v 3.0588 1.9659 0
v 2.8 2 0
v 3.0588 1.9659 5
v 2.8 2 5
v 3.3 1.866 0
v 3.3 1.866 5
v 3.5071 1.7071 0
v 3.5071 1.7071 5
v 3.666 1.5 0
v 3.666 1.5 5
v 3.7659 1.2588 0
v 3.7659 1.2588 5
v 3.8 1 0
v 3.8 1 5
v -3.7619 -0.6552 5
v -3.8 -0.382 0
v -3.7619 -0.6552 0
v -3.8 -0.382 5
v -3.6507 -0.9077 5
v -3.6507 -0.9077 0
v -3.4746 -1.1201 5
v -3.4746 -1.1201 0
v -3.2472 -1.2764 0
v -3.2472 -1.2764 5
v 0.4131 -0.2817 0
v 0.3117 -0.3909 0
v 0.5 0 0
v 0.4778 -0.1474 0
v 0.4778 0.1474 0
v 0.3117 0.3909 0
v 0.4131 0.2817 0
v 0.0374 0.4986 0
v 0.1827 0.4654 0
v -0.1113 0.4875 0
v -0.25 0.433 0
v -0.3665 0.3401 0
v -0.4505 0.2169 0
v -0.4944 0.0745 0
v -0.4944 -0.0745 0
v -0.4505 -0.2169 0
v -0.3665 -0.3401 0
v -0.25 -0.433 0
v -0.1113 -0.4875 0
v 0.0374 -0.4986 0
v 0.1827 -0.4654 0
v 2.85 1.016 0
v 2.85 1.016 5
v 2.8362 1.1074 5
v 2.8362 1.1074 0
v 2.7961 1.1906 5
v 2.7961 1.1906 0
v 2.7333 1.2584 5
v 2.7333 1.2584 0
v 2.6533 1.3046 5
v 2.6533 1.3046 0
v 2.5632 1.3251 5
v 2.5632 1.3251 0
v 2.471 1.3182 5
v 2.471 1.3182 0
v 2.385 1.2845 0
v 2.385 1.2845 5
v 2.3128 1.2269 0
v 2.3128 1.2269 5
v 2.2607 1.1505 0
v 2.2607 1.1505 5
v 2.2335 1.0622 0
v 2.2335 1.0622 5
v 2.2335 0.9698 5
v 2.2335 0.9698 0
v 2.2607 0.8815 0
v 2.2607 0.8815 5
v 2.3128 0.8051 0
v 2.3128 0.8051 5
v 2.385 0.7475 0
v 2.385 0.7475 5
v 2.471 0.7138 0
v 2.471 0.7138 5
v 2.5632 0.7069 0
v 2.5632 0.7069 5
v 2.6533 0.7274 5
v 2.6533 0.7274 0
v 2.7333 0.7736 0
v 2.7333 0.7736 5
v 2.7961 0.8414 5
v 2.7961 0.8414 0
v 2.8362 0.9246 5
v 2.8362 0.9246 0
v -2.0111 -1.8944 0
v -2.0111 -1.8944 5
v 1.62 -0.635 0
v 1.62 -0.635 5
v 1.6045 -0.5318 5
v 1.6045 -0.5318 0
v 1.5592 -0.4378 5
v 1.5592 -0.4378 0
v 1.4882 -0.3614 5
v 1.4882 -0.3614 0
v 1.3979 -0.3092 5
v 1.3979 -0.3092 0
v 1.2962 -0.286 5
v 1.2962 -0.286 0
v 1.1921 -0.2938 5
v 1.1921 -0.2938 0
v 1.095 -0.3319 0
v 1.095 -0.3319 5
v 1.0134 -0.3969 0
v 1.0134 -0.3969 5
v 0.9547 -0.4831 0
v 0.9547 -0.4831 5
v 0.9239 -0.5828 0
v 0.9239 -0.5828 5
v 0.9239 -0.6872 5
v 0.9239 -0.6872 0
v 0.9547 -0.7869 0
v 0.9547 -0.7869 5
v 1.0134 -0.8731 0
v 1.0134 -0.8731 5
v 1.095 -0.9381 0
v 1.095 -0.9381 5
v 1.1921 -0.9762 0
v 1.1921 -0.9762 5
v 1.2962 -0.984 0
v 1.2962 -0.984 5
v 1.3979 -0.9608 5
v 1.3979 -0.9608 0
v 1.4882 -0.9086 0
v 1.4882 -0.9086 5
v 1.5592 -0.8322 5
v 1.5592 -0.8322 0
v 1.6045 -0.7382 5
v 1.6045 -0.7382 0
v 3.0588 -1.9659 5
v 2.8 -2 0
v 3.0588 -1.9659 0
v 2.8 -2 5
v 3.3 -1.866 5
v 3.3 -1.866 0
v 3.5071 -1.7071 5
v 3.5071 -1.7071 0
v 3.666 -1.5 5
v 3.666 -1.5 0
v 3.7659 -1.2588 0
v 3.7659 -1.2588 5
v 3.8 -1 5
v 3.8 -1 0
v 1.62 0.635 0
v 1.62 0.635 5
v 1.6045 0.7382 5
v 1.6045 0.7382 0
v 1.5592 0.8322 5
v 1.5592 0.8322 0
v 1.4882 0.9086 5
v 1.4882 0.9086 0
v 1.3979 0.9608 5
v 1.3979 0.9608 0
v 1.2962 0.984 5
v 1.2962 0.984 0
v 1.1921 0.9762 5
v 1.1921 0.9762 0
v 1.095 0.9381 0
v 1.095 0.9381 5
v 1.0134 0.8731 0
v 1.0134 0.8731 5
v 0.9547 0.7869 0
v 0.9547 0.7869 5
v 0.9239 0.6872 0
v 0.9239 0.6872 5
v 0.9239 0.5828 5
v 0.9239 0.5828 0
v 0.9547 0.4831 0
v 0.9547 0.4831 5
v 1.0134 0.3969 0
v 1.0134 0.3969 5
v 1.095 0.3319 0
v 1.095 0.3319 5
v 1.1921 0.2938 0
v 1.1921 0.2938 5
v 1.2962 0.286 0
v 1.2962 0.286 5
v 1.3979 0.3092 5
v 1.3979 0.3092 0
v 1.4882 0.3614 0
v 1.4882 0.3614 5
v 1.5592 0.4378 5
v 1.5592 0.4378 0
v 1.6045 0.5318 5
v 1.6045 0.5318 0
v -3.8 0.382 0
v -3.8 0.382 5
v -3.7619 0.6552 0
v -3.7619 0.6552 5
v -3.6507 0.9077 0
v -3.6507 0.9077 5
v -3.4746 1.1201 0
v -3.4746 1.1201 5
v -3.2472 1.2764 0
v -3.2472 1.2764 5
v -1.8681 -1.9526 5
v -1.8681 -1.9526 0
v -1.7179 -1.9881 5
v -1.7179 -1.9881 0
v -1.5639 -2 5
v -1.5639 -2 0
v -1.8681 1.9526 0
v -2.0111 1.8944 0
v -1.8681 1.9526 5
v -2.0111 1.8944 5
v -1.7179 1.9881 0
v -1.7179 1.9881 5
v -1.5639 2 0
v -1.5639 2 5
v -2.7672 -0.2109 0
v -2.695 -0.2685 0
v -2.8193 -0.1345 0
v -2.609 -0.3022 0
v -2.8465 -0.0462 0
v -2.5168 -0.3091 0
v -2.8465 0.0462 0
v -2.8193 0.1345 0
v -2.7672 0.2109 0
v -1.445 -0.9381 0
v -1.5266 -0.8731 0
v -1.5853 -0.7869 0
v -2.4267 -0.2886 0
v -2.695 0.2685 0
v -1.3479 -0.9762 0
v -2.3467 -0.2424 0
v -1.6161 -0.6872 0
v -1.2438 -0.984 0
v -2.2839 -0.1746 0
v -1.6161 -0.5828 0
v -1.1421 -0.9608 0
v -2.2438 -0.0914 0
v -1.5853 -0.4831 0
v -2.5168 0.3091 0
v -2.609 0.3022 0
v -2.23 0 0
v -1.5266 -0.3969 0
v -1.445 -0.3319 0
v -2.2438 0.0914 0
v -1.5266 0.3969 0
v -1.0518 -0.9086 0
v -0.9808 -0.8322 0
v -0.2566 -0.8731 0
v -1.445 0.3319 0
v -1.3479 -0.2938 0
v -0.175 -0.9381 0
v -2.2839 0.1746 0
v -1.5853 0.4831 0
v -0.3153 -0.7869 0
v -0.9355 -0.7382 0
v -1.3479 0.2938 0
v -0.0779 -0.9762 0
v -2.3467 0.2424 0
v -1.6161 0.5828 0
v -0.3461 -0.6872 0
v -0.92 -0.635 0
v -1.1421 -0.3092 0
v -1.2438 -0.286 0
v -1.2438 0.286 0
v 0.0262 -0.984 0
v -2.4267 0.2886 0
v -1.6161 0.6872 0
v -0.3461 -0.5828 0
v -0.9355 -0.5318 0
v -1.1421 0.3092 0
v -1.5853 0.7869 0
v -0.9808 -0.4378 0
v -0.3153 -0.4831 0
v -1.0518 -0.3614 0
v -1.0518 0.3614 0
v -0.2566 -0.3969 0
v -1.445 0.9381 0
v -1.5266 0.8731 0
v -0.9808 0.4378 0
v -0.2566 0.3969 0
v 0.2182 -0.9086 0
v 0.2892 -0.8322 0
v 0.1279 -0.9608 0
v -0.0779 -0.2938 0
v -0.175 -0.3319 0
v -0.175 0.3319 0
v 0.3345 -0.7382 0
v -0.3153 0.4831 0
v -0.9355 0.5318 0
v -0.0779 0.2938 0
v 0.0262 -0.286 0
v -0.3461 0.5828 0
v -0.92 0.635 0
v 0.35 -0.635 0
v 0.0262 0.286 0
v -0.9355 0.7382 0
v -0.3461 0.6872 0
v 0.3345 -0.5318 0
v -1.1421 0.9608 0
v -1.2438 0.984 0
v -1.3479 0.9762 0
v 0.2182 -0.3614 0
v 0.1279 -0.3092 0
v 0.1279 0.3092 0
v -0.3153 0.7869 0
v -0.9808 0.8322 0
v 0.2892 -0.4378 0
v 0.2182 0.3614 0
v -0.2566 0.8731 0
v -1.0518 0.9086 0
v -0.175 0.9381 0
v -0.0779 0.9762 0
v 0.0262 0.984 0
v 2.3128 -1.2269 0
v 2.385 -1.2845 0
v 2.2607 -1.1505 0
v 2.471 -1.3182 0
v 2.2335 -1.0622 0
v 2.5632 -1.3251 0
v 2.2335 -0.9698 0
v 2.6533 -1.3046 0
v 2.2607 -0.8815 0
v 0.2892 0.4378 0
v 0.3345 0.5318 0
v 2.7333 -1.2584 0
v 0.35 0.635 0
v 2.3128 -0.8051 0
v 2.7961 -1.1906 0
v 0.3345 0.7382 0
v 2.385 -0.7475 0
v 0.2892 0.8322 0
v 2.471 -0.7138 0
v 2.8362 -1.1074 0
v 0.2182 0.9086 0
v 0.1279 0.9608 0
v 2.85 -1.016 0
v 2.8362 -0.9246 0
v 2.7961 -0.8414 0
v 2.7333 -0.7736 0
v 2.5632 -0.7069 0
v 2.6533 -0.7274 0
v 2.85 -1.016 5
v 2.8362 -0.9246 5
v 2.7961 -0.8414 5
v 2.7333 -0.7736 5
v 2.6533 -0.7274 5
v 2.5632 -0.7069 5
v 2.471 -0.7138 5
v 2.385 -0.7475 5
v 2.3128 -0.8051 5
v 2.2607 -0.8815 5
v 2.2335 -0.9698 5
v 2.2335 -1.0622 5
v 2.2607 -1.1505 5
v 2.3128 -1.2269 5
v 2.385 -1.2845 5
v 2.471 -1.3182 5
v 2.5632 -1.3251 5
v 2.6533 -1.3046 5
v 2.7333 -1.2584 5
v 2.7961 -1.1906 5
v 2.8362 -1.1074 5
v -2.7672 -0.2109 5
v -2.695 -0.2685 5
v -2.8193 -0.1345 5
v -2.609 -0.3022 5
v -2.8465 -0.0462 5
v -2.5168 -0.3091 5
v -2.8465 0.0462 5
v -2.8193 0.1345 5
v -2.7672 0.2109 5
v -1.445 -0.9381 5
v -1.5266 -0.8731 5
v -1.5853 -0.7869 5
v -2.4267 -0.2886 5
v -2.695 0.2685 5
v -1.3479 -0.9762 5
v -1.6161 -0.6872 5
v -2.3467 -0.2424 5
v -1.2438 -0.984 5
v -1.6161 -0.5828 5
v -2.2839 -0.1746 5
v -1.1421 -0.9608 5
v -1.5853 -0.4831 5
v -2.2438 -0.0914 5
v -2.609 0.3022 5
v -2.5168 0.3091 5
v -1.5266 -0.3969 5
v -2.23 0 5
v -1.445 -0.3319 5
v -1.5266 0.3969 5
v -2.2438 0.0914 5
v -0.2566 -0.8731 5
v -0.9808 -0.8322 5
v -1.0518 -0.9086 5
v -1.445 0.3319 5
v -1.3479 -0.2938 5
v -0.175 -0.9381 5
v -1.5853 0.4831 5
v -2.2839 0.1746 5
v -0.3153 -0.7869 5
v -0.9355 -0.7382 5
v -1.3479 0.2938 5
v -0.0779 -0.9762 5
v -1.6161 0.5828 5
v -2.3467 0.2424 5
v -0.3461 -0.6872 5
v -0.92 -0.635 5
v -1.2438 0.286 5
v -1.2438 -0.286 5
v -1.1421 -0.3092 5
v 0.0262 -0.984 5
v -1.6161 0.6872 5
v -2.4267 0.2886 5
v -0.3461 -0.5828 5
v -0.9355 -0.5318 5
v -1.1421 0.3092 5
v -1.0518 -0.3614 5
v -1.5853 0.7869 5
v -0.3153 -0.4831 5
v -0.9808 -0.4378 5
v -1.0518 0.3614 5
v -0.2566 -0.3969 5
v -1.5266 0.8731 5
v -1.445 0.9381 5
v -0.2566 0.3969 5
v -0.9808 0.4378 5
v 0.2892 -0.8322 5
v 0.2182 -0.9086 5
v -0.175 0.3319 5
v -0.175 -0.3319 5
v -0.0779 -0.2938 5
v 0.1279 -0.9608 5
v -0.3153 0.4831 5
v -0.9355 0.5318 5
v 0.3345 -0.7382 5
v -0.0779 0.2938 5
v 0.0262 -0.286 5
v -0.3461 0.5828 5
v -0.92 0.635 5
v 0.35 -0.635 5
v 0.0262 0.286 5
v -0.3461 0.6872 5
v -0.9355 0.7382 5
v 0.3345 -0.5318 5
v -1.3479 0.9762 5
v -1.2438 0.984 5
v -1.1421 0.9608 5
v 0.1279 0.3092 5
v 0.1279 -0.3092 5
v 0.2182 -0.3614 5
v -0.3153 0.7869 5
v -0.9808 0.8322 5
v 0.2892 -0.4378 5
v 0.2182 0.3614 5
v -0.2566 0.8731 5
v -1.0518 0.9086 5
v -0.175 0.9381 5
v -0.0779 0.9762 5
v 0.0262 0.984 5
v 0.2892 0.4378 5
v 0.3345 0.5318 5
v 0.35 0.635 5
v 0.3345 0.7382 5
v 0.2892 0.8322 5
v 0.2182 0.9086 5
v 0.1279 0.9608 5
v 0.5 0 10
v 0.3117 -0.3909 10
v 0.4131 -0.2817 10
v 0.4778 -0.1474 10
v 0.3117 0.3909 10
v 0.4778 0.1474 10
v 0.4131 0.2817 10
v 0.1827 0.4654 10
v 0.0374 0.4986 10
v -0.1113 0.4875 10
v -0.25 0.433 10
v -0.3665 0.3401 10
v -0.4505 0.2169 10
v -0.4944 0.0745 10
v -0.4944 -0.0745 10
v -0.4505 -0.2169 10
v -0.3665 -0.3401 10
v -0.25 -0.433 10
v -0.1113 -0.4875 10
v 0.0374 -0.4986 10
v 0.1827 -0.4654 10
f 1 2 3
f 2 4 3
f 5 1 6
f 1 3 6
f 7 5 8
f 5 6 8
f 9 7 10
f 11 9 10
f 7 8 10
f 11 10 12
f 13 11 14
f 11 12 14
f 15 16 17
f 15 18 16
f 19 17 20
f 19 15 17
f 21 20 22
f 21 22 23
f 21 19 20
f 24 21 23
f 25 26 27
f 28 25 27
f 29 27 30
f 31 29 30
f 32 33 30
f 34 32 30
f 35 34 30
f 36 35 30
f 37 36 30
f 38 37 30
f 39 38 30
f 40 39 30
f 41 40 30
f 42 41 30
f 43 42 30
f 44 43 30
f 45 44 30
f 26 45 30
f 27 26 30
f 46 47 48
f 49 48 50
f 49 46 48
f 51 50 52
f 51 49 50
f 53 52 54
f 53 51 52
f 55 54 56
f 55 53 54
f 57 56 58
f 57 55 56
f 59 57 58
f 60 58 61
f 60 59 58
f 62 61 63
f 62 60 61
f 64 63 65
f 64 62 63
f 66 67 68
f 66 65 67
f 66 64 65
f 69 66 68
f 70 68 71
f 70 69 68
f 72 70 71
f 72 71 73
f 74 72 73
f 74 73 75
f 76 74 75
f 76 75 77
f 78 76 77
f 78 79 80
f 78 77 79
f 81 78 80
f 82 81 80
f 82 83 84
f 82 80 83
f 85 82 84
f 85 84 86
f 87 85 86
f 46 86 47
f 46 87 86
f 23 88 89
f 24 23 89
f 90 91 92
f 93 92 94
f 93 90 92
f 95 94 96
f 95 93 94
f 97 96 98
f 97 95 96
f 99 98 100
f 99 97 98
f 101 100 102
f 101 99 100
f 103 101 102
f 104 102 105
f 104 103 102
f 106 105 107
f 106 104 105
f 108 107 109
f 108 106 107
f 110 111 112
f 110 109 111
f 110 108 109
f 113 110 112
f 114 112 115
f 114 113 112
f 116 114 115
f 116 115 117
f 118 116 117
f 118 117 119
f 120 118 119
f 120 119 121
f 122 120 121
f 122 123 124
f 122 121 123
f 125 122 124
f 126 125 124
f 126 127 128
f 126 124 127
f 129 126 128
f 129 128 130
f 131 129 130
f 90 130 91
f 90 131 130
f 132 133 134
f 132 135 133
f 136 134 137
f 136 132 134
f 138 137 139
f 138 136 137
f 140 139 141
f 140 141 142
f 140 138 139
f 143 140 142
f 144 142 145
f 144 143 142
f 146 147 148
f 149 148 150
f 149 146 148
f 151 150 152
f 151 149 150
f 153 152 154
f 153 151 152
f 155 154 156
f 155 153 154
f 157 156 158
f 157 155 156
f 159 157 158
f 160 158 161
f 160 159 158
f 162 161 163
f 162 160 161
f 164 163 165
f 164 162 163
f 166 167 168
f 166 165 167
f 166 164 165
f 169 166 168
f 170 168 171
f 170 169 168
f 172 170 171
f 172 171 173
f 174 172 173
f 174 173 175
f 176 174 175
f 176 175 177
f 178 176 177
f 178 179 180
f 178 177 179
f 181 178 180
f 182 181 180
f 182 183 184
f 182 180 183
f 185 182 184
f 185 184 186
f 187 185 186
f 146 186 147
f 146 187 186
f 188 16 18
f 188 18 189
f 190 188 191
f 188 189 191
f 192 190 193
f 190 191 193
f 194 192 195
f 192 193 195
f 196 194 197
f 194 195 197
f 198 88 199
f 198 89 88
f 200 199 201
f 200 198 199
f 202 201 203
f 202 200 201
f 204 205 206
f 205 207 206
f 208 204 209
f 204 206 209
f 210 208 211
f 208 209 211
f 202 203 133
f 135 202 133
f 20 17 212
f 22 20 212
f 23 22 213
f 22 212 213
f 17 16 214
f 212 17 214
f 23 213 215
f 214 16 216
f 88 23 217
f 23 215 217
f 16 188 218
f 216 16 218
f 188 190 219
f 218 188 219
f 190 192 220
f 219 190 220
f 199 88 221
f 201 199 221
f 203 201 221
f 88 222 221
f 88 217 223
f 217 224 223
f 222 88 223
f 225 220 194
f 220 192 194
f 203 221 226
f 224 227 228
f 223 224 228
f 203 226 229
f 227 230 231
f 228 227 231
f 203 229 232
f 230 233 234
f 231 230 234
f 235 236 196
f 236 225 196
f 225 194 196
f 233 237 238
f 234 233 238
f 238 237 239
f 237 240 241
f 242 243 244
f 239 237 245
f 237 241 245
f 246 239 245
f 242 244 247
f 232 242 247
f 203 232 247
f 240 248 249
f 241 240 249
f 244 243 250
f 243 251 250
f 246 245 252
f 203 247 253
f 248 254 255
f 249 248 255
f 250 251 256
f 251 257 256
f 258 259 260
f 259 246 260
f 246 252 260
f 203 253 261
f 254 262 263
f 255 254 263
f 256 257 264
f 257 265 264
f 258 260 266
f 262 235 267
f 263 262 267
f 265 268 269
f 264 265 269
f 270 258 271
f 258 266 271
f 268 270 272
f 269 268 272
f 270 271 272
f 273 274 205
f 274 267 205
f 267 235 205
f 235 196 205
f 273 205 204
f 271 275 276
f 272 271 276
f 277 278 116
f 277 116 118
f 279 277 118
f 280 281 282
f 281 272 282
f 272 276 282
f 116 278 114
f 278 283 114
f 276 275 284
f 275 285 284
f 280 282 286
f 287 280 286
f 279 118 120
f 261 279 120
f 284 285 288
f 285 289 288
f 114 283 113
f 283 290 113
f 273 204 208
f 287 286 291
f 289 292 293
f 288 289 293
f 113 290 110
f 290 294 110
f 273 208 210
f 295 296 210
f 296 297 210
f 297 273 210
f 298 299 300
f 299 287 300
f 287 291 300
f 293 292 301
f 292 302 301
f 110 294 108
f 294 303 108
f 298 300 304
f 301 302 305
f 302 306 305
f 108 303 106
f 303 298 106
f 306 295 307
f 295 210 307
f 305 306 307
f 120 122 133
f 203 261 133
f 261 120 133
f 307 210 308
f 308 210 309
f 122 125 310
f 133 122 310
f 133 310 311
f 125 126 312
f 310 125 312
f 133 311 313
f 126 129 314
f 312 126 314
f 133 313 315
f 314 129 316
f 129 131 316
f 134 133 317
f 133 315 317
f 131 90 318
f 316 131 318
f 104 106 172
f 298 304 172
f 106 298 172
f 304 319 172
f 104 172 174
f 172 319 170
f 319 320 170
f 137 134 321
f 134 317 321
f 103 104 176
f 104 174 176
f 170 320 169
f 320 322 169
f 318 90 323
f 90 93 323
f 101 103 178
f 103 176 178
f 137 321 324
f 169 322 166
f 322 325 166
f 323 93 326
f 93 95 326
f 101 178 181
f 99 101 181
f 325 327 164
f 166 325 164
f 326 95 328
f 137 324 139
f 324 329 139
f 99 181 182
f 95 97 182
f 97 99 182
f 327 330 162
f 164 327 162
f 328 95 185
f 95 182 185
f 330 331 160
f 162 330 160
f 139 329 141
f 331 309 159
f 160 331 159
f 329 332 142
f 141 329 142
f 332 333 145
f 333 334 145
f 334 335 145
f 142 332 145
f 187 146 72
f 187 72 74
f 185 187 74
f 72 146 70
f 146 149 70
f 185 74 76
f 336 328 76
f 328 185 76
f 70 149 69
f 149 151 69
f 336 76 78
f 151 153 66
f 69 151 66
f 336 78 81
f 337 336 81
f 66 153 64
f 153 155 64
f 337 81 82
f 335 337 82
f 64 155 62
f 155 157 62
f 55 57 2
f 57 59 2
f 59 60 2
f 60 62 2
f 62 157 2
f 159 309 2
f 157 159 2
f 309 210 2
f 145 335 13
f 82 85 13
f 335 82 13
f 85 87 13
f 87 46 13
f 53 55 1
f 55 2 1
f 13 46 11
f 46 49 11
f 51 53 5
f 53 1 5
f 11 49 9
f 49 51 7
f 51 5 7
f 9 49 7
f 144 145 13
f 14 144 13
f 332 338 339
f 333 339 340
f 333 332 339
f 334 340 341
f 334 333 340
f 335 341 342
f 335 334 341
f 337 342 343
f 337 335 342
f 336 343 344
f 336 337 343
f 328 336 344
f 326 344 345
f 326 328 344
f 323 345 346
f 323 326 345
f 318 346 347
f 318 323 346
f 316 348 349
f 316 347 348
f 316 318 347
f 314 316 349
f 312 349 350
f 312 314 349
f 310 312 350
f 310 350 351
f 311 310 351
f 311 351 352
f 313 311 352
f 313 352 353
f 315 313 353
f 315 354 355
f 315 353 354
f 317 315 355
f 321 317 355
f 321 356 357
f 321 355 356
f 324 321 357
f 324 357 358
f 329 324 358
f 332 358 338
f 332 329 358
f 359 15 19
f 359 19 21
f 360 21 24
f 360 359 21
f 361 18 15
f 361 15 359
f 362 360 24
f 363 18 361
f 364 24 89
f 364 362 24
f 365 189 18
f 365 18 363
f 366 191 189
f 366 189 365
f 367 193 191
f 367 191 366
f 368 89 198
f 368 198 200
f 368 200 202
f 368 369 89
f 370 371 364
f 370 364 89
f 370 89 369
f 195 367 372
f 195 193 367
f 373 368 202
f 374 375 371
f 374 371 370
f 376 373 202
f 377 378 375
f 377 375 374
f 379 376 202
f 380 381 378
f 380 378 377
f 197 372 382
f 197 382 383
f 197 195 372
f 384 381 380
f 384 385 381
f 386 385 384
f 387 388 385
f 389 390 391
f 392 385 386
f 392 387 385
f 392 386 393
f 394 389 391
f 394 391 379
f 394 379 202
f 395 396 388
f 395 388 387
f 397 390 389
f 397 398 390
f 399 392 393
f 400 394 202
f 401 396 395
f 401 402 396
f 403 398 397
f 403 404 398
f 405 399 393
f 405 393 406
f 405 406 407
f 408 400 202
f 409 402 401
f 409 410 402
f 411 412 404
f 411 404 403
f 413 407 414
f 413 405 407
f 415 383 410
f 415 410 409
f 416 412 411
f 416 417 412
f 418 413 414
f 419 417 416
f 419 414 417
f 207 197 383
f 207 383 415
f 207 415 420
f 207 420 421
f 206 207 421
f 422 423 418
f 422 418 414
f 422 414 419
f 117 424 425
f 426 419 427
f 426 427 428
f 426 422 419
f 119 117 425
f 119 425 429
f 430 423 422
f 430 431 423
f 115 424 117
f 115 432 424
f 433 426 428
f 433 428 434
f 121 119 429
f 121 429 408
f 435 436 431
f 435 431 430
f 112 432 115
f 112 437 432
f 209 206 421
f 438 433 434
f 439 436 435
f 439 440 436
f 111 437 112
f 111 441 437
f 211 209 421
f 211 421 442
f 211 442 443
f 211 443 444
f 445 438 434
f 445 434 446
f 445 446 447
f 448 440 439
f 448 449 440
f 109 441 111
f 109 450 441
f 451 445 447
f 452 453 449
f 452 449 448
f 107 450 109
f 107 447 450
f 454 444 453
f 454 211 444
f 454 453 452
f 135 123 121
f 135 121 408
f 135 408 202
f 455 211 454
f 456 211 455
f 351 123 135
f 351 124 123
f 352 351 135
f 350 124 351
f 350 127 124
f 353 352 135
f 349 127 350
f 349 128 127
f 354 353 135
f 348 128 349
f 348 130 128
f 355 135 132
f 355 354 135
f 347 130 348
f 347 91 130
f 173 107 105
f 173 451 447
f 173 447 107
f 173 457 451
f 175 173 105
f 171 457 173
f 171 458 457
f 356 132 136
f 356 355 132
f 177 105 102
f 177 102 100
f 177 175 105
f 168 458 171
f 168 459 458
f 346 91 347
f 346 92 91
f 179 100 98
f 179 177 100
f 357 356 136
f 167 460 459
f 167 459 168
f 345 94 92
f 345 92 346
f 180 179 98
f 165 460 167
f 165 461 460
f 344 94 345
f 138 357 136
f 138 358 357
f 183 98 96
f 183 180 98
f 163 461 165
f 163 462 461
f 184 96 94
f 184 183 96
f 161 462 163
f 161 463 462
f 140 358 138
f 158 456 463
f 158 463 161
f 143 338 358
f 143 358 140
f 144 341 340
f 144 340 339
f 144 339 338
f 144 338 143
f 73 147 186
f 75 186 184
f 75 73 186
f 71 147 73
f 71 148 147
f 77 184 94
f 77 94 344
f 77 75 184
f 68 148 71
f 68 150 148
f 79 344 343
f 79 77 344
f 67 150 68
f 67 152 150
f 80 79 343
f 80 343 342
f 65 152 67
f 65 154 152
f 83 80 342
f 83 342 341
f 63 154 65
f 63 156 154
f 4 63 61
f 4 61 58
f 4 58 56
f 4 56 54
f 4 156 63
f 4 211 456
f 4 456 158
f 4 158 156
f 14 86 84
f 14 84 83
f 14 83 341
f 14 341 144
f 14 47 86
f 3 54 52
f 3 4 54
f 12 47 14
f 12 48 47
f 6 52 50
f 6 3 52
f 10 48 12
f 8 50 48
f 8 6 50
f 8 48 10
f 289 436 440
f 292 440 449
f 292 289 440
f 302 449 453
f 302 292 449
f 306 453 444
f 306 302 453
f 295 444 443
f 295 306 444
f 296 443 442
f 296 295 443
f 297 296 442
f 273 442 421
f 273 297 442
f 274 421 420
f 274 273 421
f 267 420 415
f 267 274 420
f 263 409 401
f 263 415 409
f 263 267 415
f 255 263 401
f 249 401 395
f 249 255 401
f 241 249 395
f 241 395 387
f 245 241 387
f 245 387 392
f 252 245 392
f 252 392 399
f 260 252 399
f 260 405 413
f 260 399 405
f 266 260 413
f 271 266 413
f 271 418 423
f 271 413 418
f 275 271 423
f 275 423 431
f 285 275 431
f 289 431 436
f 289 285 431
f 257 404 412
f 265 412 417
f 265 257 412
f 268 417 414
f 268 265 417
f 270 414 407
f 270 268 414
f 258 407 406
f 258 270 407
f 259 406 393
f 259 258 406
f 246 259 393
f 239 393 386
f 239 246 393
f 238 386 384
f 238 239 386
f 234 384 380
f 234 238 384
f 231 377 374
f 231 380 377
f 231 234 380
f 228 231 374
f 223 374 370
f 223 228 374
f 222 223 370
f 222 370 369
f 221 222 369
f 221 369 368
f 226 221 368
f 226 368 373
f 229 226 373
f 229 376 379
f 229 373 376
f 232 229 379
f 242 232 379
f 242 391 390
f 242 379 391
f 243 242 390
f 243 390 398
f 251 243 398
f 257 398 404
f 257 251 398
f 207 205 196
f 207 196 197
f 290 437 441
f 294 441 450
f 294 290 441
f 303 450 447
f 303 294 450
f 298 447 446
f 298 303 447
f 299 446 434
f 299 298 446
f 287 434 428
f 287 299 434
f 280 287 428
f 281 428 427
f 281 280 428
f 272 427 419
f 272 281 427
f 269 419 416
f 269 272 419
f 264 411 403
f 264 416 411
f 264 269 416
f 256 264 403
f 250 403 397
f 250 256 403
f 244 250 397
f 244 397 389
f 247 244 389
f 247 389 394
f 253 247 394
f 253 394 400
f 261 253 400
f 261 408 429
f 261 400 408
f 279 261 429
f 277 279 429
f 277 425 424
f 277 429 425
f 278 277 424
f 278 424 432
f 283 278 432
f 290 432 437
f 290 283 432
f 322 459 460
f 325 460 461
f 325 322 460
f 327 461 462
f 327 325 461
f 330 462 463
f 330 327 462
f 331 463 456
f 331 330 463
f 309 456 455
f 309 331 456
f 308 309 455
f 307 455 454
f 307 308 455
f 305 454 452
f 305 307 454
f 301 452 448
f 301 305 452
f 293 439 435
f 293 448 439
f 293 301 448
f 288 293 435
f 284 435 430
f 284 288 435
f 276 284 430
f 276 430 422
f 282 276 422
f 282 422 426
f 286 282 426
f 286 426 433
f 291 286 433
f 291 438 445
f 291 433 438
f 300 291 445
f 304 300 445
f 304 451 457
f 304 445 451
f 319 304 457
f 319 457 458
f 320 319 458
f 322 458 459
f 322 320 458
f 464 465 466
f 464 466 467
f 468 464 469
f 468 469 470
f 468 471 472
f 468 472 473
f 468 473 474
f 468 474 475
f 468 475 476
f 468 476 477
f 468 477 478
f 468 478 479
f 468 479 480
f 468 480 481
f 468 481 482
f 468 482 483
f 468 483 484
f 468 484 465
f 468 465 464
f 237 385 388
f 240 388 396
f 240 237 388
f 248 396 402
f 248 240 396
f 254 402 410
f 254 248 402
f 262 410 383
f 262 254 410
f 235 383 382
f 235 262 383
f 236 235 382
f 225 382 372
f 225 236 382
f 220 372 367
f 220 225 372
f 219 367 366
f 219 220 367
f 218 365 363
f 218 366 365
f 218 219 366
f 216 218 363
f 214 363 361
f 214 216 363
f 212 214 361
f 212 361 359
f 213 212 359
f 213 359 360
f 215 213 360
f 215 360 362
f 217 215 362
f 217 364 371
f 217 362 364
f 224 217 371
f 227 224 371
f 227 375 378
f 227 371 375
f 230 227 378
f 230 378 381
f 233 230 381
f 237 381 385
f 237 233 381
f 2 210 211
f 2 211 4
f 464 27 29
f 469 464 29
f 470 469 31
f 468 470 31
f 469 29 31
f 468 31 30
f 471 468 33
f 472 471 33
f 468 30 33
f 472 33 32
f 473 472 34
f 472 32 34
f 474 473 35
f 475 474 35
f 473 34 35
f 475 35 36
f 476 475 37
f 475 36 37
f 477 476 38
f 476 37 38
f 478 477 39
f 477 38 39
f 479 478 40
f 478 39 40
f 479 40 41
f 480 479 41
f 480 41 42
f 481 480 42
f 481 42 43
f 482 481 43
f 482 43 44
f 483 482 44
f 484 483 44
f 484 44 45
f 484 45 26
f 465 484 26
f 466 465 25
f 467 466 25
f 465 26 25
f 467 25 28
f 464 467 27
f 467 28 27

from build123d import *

# Parameters (mm, degrees)
CYLINDER_R        = 0.5
CYLINDER_DEPTH    = 10
CYLINDER001_R     = 0.35
CYLINDER001_DEPTH = 10
CYLINDER002_R     = 0.35
CYLINDER002_DEPTH = 10
CYLINDER003_R     = 0.35
CYLINDER003_DEPTH = 10
CYLINDER004_R     = 0.35
CYLINDER004_DEPTH = 10
CYLINDER005_R     = 0.35
CYLINDER005_DEPTH = 10
CYLINDER006_R     = 0.35
CYLINDER006_DEPTH = 10
CYLINDER008_R     = 0.31
CYLINDER008_DEPTH = 10
CYLINDER009_R     = 0.31
CYLINDER009_DEPTH = 10
CYLINDER007_R     = 0.31
CYLINDER007_DEPTH = 10
BOX_W             = 7.6
BOX_H             = 4
BOX_DEPTH         = 5
CHAMFER_SIZE2     = 2
CHAMFER_SIZE      = 1
FILLET_R          = 1


with BuildPart() as cylinder:
    # Cylinder → Cylinder (new body)
    with BuildSketch(Plane.XY):
        Circle(CYLINDER_R)
    extrude(amount=CYLINDER_DEPTH)


with BuildPart() as pin001:
    # Cylinder001 → Cylinder001 (new body)
    with BuildSketch(Plane(origin=(0, 0.635, 0), x_dir=(1, 0, 0), z_dir=(0, 0, 1))):
        Circle(CYLINDER001_R)
    extrude(amount=CYLINDER001_DEPTH)


with BuildPart() as pin002:
    # Cylinder002 → Cylinder002 (new body)
    with BuildSketch(Plane(origin=(0, -0.635, 0), x_dir=(1, 0, 0), z_dir=(0, 0, 1))):
        Circle(CYLINDER002_R)
    extrude(amount=CYLINDER002_DEPTH)


with BuildPart() as pin003:
    # Cylinder003 → Cylinder003 (new body)
    with BuildSketch(Plane(origin=(-1.27, 0.635, 0), x_dir=(1, 0, 0), z_dir=(0, 0, 1))):
        Circle(CYLINDER003_R)
    extrude(amount=CYLINDER003_DEPTH)


with BuildPart() as pin004:
    # Cylinder004 → Cylinder004 (new body)
    with BuildSketch(Plane(origin=(-1.27, -0.635, 0), x_dir=(1, 0, 0), z_dir=(0, 0, 1))):
        Circle(CYLINDER004_R)
    extrude(amount=CYLINDER004_DEPTH)


with BuildPart() as pin005:
    # Cylinder005 → Cylinder005 (new body)
    with BuildSketch(Plane(origin=(1.27, 0.635, 0), x_dir=(1, 0, 0), z_dir=(0, 0, 1))):
        Circle(CYLINDER005_R)
    extrude(amount=CYLINDER005_DEPTH)


with BuildPart() as pins:
    # Cylinder006 → Cylinder006 (new body)
    with BuildSketch(Plane(origin=(1.27, -0.635, 0), x_dir=(1, 0, 0), z_dir=(0, 0, 1))):
        Circle(CYLINDER006_R)
    extrude(amount=CYLINDER006_DEPTH)

    # Compound: union pin001, pin002, pin003, pin004, pin005
    add(pin001.part)
    add(pin002.part)
    add(pin003.part)
    add(pin004.part)
    add(pin005.part)


with BuildPart() as guide002:
    # Cylinder008 → Cylinder008 (new body)
    with BuildSketch(Plane(origin=(2.54, 1.016, 0), x_dir=(1, 0, 0), z_dir=(0, 0, 1))):
        Circle(CYLINDER008_R)
    extrude(amount=CYLINDER008_DEPTH)


with BuildPart() as guide003:
    # Cylinder009 → Cylinder009 (new body)
    with BuildSketch(Plane(origin=(2.54, -1.016, 0), x_dir=(1, 0, 0), z_dir=(0, 0, 1))):
        Circle(CYLINDER009_R)
    extrude(amount=CYLINDER009_DEPTH)


with BuildPart() as cutouts:
    # Cylinder007 → Cylinder007 (new body)
    with BuildSketch(Plane(origin=(-2.54, 0, 0), x_dir=(1, 0, 0), z_dir=(0, 0, 1))):
        Circle(CYLINDER007_R)
    extrude(amount=CYLINDER007_DEPTH)

    # Compound001: union guide002, guide003
    add(guide002.part)
    add(guide003.part)

    # Compound002: union Pins
    add(pins.part)


with BuildPart() as tc2030_nl:
    # Box → Box (new body)
    with BuildSketch(Plane(origin=(-3.8, -2, 0), x_dir=(1, 0, 0), z_dir=(0, 0, 1))):
        with Locations((3.8, 2)):
            Rectangle(BOX_W, BOX_H)
    extrude(amount=BOX_DEPTH)

    # Chamfer
    chamfer_edges = [tc2030_nl.edges().sort_by_distance(p)[0] for p in [
        (-3.8, -2, 2.5),
        (-3.8, 2, 2.5),
    ]]
    chamfer_side = tc2030_nl.faces().sort_by_distance((-3.8, 0, 2.5))[0]
    chamfer(chamfer_edges, length=CHAMFER_SIZE, length2=CHAMFER_SIZE2, reference=chamfer_side)

    # Fillet
    fillet_edges = [tc2030_nl.edges().sort_by_distance(p)[0] for p in [
        (-3.8, -1, 2.5),
        (-3.8, 1, 2.5),
        (-1.8, -2, 2.5),
        (-1.8, 2, 2.5),
        (3.8, -2, 2.5),
        (3.8, 2, 2.5),
    ]]
    fillet(fillet_edges, radius=FILLET_R)

    # Cut: cut Cutouts
    add(cutouts.part, mode=Mode.SUBTRACT)


solid = Compound([cylinder.part, tc2030_nl.part])
